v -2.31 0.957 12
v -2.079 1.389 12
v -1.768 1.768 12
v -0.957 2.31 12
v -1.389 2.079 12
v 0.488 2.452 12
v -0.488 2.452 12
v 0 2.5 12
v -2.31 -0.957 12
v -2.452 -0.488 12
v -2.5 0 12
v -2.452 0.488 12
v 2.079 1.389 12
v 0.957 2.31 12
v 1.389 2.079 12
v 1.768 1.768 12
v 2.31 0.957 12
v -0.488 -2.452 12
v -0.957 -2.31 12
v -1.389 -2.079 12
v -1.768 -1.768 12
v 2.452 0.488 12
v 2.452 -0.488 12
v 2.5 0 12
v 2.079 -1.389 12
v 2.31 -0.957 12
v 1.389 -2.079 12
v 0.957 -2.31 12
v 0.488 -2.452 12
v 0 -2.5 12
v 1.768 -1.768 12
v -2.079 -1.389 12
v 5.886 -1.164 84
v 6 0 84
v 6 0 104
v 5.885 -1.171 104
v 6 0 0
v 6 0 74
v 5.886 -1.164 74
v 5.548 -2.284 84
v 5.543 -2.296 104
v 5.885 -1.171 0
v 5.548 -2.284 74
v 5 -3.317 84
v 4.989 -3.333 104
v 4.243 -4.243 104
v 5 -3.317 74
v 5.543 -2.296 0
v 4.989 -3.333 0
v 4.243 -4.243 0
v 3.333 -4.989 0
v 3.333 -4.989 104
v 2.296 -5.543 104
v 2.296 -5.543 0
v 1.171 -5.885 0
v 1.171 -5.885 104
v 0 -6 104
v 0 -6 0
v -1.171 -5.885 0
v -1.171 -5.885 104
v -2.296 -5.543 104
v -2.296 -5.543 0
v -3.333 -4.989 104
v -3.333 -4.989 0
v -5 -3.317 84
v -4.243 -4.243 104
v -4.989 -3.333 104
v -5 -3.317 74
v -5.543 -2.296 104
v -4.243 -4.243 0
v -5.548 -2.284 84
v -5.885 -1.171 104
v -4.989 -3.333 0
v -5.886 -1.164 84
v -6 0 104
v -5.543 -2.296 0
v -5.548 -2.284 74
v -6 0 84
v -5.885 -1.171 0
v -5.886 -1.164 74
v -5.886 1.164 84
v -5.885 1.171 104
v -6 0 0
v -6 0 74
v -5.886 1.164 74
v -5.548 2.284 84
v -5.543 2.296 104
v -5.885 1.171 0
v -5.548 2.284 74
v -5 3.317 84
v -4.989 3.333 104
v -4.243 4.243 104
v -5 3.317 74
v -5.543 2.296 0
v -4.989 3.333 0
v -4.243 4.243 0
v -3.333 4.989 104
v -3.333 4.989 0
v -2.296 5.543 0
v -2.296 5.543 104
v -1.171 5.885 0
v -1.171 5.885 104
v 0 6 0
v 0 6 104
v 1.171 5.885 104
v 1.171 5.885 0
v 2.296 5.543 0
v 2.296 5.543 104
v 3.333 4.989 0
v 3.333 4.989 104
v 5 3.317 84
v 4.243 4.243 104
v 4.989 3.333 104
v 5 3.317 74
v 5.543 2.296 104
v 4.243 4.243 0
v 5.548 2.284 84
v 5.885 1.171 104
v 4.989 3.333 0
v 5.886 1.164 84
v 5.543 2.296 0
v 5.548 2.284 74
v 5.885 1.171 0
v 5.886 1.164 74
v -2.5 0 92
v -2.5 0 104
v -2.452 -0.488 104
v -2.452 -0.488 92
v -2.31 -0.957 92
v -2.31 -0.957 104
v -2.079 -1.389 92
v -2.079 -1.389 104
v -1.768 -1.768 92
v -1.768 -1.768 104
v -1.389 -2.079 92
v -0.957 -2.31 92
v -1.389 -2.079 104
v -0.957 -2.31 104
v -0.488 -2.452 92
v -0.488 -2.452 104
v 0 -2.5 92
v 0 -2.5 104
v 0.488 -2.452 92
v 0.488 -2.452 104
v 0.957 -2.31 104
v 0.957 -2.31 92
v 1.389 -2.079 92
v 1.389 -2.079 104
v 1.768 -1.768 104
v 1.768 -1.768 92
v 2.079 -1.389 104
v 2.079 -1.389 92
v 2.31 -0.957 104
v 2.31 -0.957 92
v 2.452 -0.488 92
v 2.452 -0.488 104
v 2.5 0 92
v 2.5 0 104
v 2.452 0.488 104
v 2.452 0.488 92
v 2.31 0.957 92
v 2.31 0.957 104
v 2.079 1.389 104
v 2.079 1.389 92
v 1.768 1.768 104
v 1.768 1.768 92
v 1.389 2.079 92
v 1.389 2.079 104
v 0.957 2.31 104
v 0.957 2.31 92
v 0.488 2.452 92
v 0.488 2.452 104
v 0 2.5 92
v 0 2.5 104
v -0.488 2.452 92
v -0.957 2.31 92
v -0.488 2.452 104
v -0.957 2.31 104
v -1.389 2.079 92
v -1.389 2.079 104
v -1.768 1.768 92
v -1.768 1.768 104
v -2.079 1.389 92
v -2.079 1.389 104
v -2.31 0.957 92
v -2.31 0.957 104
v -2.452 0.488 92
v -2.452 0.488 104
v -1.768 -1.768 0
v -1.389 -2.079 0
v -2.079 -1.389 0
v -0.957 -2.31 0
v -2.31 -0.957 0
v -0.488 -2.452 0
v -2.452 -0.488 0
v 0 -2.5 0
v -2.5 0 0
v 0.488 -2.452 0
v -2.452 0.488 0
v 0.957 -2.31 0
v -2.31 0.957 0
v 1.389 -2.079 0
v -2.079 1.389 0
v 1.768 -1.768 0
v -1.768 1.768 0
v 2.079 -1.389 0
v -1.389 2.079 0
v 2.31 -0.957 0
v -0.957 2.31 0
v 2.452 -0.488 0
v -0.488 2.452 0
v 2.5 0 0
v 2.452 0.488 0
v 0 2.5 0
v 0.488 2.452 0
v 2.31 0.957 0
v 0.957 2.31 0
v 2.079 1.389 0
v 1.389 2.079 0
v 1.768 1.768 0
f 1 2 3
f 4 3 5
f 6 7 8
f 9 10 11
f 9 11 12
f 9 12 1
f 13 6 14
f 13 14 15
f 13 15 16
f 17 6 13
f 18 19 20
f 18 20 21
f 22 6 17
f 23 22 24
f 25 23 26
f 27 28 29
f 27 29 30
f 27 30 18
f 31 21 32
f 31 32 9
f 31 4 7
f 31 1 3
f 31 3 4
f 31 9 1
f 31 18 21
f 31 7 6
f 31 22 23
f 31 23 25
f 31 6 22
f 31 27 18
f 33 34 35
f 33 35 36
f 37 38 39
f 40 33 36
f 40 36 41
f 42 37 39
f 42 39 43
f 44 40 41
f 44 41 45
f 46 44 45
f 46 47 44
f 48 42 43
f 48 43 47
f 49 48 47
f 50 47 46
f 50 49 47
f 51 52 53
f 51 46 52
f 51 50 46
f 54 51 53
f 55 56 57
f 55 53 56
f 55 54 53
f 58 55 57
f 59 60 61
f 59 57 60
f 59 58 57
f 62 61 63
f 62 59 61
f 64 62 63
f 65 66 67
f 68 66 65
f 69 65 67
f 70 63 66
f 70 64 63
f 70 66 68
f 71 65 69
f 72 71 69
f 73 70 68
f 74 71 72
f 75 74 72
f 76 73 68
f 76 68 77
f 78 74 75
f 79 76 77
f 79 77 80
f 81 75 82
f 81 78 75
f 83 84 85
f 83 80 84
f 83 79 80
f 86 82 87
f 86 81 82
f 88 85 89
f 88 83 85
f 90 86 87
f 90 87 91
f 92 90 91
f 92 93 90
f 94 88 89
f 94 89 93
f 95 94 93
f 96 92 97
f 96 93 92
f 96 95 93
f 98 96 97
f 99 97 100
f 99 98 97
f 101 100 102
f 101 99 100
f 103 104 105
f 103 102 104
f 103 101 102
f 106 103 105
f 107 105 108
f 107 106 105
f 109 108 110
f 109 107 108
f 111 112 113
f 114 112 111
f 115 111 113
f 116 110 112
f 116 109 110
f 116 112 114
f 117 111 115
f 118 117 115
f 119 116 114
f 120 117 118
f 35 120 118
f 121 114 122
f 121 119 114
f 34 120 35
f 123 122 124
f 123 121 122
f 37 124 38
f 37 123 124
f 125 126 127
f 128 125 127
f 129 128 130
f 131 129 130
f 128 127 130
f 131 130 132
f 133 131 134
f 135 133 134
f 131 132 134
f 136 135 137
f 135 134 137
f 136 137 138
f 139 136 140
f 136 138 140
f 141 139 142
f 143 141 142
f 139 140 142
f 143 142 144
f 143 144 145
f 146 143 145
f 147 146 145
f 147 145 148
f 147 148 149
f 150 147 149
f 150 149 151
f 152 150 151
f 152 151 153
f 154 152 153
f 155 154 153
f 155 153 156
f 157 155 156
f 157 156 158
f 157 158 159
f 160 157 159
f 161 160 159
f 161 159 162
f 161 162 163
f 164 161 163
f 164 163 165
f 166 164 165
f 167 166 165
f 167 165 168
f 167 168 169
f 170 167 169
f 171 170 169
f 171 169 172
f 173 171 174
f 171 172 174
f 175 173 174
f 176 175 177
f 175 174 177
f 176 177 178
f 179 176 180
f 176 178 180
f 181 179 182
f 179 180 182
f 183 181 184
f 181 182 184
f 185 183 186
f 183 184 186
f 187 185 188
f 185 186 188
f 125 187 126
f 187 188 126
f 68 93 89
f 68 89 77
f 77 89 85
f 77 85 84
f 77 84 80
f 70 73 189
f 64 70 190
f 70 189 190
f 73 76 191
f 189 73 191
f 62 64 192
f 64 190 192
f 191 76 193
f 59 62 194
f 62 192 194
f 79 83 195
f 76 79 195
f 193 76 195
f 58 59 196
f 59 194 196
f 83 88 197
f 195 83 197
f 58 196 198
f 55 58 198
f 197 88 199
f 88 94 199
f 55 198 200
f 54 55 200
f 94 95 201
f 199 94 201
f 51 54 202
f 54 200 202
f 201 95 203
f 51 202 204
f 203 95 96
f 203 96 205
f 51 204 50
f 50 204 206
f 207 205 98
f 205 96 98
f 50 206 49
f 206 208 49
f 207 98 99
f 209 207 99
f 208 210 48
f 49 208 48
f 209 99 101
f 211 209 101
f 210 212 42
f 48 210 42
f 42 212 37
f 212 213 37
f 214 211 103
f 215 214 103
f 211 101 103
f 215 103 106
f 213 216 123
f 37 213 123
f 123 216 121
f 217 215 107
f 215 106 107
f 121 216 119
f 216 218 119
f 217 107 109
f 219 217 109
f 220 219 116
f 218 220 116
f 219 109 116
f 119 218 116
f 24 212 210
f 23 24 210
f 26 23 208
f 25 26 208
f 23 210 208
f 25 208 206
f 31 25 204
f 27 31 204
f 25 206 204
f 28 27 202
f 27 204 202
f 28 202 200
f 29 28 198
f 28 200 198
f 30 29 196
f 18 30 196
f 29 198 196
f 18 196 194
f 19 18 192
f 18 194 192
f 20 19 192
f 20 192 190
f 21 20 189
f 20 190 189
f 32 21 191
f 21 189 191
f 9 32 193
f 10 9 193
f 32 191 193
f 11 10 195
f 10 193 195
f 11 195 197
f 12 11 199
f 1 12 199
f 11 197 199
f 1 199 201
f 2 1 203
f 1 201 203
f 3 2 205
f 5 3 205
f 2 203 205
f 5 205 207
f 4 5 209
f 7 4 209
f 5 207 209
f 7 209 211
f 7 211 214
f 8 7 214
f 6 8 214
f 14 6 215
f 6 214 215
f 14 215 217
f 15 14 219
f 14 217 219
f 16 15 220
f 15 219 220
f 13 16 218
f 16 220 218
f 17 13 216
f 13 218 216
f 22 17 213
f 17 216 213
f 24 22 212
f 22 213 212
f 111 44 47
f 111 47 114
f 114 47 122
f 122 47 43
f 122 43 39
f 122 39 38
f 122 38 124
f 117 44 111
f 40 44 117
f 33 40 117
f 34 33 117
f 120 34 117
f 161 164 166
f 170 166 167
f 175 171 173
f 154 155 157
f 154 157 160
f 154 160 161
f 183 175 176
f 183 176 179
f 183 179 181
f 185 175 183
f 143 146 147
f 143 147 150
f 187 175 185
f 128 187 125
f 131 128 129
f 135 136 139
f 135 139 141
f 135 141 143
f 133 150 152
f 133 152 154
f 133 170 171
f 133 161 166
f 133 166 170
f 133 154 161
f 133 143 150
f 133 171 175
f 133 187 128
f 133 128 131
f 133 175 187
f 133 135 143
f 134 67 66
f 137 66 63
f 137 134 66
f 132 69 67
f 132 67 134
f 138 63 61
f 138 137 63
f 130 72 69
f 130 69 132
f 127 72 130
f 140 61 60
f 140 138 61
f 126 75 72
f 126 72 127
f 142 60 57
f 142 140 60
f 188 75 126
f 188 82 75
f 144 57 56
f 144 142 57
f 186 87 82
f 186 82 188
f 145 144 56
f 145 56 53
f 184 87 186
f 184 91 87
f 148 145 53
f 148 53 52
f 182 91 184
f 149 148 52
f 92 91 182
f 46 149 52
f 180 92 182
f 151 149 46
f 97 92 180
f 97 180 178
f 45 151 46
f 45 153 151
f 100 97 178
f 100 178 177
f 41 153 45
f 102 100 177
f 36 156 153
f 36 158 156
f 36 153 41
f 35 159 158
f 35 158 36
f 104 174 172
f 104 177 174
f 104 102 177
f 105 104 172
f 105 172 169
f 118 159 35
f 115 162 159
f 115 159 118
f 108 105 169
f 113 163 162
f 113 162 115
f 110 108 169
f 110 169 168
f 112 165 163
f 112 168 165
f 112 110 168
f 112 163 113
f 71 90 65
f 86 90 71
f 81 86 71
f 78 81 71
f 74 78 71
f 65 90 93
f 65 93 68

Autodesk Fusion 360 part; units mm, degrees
sketch "Esquisse1" plane through (0, 0, 0) normal (0, 0, 1) x (1, 0, 0)
  circle A0 centre (0, 0) radius 6
  dimension "d1" = 12
extrude "Extrusion1" add sketch "Esquisse1" along normal blind 104
sketch "Esquisse2" plane through (0, 0, 104) normal (0, 0, 1) x (-1, 0, 0)
  circle A0 centre (0, 0) radius 6
  circle A1 centre (0, 0) radius 2.5
  dimension "d5" = 5
extrude "Extrusion2" cut sketch "Esquisse2" against normal blind 12 contours A1
sketch "Esquisse3" plane through (0, 0, 0) normal (0, 0, -1) x (1, 0, 0)
  circle A0 centre (0, 0) radius 6
  circle A1 centre (0, 0) radius 2.5
  dimension "d8" = 5
extrude "Extrusion3" cut sketch "Esquisse3" against normal blind 12 contours A1
sketch "Esquisse4" plane through (0, 0, 104) normal (0, 0, 1) x (-1, 0, 0)
  circle A0 centre (0, 0) radius 2.5
  circle A1 centre (0, 0) radius 6
  line L0 (5, 8) -> (-5, 8)
  line L1 (-5, 8) -> (-5, -7.4606)
  line L2 (-5, -7.4606) -> (5, -7.4606)
  line L3 (5, -7.4606) -> (5, 8)
  dimension "d11" = 5
  dimension "d12" = 10
extrude "Extrusion4" cut sketch "Esquisse4" against normal blind 10 from surface at -20 contours A1 L3 | A1 L1
